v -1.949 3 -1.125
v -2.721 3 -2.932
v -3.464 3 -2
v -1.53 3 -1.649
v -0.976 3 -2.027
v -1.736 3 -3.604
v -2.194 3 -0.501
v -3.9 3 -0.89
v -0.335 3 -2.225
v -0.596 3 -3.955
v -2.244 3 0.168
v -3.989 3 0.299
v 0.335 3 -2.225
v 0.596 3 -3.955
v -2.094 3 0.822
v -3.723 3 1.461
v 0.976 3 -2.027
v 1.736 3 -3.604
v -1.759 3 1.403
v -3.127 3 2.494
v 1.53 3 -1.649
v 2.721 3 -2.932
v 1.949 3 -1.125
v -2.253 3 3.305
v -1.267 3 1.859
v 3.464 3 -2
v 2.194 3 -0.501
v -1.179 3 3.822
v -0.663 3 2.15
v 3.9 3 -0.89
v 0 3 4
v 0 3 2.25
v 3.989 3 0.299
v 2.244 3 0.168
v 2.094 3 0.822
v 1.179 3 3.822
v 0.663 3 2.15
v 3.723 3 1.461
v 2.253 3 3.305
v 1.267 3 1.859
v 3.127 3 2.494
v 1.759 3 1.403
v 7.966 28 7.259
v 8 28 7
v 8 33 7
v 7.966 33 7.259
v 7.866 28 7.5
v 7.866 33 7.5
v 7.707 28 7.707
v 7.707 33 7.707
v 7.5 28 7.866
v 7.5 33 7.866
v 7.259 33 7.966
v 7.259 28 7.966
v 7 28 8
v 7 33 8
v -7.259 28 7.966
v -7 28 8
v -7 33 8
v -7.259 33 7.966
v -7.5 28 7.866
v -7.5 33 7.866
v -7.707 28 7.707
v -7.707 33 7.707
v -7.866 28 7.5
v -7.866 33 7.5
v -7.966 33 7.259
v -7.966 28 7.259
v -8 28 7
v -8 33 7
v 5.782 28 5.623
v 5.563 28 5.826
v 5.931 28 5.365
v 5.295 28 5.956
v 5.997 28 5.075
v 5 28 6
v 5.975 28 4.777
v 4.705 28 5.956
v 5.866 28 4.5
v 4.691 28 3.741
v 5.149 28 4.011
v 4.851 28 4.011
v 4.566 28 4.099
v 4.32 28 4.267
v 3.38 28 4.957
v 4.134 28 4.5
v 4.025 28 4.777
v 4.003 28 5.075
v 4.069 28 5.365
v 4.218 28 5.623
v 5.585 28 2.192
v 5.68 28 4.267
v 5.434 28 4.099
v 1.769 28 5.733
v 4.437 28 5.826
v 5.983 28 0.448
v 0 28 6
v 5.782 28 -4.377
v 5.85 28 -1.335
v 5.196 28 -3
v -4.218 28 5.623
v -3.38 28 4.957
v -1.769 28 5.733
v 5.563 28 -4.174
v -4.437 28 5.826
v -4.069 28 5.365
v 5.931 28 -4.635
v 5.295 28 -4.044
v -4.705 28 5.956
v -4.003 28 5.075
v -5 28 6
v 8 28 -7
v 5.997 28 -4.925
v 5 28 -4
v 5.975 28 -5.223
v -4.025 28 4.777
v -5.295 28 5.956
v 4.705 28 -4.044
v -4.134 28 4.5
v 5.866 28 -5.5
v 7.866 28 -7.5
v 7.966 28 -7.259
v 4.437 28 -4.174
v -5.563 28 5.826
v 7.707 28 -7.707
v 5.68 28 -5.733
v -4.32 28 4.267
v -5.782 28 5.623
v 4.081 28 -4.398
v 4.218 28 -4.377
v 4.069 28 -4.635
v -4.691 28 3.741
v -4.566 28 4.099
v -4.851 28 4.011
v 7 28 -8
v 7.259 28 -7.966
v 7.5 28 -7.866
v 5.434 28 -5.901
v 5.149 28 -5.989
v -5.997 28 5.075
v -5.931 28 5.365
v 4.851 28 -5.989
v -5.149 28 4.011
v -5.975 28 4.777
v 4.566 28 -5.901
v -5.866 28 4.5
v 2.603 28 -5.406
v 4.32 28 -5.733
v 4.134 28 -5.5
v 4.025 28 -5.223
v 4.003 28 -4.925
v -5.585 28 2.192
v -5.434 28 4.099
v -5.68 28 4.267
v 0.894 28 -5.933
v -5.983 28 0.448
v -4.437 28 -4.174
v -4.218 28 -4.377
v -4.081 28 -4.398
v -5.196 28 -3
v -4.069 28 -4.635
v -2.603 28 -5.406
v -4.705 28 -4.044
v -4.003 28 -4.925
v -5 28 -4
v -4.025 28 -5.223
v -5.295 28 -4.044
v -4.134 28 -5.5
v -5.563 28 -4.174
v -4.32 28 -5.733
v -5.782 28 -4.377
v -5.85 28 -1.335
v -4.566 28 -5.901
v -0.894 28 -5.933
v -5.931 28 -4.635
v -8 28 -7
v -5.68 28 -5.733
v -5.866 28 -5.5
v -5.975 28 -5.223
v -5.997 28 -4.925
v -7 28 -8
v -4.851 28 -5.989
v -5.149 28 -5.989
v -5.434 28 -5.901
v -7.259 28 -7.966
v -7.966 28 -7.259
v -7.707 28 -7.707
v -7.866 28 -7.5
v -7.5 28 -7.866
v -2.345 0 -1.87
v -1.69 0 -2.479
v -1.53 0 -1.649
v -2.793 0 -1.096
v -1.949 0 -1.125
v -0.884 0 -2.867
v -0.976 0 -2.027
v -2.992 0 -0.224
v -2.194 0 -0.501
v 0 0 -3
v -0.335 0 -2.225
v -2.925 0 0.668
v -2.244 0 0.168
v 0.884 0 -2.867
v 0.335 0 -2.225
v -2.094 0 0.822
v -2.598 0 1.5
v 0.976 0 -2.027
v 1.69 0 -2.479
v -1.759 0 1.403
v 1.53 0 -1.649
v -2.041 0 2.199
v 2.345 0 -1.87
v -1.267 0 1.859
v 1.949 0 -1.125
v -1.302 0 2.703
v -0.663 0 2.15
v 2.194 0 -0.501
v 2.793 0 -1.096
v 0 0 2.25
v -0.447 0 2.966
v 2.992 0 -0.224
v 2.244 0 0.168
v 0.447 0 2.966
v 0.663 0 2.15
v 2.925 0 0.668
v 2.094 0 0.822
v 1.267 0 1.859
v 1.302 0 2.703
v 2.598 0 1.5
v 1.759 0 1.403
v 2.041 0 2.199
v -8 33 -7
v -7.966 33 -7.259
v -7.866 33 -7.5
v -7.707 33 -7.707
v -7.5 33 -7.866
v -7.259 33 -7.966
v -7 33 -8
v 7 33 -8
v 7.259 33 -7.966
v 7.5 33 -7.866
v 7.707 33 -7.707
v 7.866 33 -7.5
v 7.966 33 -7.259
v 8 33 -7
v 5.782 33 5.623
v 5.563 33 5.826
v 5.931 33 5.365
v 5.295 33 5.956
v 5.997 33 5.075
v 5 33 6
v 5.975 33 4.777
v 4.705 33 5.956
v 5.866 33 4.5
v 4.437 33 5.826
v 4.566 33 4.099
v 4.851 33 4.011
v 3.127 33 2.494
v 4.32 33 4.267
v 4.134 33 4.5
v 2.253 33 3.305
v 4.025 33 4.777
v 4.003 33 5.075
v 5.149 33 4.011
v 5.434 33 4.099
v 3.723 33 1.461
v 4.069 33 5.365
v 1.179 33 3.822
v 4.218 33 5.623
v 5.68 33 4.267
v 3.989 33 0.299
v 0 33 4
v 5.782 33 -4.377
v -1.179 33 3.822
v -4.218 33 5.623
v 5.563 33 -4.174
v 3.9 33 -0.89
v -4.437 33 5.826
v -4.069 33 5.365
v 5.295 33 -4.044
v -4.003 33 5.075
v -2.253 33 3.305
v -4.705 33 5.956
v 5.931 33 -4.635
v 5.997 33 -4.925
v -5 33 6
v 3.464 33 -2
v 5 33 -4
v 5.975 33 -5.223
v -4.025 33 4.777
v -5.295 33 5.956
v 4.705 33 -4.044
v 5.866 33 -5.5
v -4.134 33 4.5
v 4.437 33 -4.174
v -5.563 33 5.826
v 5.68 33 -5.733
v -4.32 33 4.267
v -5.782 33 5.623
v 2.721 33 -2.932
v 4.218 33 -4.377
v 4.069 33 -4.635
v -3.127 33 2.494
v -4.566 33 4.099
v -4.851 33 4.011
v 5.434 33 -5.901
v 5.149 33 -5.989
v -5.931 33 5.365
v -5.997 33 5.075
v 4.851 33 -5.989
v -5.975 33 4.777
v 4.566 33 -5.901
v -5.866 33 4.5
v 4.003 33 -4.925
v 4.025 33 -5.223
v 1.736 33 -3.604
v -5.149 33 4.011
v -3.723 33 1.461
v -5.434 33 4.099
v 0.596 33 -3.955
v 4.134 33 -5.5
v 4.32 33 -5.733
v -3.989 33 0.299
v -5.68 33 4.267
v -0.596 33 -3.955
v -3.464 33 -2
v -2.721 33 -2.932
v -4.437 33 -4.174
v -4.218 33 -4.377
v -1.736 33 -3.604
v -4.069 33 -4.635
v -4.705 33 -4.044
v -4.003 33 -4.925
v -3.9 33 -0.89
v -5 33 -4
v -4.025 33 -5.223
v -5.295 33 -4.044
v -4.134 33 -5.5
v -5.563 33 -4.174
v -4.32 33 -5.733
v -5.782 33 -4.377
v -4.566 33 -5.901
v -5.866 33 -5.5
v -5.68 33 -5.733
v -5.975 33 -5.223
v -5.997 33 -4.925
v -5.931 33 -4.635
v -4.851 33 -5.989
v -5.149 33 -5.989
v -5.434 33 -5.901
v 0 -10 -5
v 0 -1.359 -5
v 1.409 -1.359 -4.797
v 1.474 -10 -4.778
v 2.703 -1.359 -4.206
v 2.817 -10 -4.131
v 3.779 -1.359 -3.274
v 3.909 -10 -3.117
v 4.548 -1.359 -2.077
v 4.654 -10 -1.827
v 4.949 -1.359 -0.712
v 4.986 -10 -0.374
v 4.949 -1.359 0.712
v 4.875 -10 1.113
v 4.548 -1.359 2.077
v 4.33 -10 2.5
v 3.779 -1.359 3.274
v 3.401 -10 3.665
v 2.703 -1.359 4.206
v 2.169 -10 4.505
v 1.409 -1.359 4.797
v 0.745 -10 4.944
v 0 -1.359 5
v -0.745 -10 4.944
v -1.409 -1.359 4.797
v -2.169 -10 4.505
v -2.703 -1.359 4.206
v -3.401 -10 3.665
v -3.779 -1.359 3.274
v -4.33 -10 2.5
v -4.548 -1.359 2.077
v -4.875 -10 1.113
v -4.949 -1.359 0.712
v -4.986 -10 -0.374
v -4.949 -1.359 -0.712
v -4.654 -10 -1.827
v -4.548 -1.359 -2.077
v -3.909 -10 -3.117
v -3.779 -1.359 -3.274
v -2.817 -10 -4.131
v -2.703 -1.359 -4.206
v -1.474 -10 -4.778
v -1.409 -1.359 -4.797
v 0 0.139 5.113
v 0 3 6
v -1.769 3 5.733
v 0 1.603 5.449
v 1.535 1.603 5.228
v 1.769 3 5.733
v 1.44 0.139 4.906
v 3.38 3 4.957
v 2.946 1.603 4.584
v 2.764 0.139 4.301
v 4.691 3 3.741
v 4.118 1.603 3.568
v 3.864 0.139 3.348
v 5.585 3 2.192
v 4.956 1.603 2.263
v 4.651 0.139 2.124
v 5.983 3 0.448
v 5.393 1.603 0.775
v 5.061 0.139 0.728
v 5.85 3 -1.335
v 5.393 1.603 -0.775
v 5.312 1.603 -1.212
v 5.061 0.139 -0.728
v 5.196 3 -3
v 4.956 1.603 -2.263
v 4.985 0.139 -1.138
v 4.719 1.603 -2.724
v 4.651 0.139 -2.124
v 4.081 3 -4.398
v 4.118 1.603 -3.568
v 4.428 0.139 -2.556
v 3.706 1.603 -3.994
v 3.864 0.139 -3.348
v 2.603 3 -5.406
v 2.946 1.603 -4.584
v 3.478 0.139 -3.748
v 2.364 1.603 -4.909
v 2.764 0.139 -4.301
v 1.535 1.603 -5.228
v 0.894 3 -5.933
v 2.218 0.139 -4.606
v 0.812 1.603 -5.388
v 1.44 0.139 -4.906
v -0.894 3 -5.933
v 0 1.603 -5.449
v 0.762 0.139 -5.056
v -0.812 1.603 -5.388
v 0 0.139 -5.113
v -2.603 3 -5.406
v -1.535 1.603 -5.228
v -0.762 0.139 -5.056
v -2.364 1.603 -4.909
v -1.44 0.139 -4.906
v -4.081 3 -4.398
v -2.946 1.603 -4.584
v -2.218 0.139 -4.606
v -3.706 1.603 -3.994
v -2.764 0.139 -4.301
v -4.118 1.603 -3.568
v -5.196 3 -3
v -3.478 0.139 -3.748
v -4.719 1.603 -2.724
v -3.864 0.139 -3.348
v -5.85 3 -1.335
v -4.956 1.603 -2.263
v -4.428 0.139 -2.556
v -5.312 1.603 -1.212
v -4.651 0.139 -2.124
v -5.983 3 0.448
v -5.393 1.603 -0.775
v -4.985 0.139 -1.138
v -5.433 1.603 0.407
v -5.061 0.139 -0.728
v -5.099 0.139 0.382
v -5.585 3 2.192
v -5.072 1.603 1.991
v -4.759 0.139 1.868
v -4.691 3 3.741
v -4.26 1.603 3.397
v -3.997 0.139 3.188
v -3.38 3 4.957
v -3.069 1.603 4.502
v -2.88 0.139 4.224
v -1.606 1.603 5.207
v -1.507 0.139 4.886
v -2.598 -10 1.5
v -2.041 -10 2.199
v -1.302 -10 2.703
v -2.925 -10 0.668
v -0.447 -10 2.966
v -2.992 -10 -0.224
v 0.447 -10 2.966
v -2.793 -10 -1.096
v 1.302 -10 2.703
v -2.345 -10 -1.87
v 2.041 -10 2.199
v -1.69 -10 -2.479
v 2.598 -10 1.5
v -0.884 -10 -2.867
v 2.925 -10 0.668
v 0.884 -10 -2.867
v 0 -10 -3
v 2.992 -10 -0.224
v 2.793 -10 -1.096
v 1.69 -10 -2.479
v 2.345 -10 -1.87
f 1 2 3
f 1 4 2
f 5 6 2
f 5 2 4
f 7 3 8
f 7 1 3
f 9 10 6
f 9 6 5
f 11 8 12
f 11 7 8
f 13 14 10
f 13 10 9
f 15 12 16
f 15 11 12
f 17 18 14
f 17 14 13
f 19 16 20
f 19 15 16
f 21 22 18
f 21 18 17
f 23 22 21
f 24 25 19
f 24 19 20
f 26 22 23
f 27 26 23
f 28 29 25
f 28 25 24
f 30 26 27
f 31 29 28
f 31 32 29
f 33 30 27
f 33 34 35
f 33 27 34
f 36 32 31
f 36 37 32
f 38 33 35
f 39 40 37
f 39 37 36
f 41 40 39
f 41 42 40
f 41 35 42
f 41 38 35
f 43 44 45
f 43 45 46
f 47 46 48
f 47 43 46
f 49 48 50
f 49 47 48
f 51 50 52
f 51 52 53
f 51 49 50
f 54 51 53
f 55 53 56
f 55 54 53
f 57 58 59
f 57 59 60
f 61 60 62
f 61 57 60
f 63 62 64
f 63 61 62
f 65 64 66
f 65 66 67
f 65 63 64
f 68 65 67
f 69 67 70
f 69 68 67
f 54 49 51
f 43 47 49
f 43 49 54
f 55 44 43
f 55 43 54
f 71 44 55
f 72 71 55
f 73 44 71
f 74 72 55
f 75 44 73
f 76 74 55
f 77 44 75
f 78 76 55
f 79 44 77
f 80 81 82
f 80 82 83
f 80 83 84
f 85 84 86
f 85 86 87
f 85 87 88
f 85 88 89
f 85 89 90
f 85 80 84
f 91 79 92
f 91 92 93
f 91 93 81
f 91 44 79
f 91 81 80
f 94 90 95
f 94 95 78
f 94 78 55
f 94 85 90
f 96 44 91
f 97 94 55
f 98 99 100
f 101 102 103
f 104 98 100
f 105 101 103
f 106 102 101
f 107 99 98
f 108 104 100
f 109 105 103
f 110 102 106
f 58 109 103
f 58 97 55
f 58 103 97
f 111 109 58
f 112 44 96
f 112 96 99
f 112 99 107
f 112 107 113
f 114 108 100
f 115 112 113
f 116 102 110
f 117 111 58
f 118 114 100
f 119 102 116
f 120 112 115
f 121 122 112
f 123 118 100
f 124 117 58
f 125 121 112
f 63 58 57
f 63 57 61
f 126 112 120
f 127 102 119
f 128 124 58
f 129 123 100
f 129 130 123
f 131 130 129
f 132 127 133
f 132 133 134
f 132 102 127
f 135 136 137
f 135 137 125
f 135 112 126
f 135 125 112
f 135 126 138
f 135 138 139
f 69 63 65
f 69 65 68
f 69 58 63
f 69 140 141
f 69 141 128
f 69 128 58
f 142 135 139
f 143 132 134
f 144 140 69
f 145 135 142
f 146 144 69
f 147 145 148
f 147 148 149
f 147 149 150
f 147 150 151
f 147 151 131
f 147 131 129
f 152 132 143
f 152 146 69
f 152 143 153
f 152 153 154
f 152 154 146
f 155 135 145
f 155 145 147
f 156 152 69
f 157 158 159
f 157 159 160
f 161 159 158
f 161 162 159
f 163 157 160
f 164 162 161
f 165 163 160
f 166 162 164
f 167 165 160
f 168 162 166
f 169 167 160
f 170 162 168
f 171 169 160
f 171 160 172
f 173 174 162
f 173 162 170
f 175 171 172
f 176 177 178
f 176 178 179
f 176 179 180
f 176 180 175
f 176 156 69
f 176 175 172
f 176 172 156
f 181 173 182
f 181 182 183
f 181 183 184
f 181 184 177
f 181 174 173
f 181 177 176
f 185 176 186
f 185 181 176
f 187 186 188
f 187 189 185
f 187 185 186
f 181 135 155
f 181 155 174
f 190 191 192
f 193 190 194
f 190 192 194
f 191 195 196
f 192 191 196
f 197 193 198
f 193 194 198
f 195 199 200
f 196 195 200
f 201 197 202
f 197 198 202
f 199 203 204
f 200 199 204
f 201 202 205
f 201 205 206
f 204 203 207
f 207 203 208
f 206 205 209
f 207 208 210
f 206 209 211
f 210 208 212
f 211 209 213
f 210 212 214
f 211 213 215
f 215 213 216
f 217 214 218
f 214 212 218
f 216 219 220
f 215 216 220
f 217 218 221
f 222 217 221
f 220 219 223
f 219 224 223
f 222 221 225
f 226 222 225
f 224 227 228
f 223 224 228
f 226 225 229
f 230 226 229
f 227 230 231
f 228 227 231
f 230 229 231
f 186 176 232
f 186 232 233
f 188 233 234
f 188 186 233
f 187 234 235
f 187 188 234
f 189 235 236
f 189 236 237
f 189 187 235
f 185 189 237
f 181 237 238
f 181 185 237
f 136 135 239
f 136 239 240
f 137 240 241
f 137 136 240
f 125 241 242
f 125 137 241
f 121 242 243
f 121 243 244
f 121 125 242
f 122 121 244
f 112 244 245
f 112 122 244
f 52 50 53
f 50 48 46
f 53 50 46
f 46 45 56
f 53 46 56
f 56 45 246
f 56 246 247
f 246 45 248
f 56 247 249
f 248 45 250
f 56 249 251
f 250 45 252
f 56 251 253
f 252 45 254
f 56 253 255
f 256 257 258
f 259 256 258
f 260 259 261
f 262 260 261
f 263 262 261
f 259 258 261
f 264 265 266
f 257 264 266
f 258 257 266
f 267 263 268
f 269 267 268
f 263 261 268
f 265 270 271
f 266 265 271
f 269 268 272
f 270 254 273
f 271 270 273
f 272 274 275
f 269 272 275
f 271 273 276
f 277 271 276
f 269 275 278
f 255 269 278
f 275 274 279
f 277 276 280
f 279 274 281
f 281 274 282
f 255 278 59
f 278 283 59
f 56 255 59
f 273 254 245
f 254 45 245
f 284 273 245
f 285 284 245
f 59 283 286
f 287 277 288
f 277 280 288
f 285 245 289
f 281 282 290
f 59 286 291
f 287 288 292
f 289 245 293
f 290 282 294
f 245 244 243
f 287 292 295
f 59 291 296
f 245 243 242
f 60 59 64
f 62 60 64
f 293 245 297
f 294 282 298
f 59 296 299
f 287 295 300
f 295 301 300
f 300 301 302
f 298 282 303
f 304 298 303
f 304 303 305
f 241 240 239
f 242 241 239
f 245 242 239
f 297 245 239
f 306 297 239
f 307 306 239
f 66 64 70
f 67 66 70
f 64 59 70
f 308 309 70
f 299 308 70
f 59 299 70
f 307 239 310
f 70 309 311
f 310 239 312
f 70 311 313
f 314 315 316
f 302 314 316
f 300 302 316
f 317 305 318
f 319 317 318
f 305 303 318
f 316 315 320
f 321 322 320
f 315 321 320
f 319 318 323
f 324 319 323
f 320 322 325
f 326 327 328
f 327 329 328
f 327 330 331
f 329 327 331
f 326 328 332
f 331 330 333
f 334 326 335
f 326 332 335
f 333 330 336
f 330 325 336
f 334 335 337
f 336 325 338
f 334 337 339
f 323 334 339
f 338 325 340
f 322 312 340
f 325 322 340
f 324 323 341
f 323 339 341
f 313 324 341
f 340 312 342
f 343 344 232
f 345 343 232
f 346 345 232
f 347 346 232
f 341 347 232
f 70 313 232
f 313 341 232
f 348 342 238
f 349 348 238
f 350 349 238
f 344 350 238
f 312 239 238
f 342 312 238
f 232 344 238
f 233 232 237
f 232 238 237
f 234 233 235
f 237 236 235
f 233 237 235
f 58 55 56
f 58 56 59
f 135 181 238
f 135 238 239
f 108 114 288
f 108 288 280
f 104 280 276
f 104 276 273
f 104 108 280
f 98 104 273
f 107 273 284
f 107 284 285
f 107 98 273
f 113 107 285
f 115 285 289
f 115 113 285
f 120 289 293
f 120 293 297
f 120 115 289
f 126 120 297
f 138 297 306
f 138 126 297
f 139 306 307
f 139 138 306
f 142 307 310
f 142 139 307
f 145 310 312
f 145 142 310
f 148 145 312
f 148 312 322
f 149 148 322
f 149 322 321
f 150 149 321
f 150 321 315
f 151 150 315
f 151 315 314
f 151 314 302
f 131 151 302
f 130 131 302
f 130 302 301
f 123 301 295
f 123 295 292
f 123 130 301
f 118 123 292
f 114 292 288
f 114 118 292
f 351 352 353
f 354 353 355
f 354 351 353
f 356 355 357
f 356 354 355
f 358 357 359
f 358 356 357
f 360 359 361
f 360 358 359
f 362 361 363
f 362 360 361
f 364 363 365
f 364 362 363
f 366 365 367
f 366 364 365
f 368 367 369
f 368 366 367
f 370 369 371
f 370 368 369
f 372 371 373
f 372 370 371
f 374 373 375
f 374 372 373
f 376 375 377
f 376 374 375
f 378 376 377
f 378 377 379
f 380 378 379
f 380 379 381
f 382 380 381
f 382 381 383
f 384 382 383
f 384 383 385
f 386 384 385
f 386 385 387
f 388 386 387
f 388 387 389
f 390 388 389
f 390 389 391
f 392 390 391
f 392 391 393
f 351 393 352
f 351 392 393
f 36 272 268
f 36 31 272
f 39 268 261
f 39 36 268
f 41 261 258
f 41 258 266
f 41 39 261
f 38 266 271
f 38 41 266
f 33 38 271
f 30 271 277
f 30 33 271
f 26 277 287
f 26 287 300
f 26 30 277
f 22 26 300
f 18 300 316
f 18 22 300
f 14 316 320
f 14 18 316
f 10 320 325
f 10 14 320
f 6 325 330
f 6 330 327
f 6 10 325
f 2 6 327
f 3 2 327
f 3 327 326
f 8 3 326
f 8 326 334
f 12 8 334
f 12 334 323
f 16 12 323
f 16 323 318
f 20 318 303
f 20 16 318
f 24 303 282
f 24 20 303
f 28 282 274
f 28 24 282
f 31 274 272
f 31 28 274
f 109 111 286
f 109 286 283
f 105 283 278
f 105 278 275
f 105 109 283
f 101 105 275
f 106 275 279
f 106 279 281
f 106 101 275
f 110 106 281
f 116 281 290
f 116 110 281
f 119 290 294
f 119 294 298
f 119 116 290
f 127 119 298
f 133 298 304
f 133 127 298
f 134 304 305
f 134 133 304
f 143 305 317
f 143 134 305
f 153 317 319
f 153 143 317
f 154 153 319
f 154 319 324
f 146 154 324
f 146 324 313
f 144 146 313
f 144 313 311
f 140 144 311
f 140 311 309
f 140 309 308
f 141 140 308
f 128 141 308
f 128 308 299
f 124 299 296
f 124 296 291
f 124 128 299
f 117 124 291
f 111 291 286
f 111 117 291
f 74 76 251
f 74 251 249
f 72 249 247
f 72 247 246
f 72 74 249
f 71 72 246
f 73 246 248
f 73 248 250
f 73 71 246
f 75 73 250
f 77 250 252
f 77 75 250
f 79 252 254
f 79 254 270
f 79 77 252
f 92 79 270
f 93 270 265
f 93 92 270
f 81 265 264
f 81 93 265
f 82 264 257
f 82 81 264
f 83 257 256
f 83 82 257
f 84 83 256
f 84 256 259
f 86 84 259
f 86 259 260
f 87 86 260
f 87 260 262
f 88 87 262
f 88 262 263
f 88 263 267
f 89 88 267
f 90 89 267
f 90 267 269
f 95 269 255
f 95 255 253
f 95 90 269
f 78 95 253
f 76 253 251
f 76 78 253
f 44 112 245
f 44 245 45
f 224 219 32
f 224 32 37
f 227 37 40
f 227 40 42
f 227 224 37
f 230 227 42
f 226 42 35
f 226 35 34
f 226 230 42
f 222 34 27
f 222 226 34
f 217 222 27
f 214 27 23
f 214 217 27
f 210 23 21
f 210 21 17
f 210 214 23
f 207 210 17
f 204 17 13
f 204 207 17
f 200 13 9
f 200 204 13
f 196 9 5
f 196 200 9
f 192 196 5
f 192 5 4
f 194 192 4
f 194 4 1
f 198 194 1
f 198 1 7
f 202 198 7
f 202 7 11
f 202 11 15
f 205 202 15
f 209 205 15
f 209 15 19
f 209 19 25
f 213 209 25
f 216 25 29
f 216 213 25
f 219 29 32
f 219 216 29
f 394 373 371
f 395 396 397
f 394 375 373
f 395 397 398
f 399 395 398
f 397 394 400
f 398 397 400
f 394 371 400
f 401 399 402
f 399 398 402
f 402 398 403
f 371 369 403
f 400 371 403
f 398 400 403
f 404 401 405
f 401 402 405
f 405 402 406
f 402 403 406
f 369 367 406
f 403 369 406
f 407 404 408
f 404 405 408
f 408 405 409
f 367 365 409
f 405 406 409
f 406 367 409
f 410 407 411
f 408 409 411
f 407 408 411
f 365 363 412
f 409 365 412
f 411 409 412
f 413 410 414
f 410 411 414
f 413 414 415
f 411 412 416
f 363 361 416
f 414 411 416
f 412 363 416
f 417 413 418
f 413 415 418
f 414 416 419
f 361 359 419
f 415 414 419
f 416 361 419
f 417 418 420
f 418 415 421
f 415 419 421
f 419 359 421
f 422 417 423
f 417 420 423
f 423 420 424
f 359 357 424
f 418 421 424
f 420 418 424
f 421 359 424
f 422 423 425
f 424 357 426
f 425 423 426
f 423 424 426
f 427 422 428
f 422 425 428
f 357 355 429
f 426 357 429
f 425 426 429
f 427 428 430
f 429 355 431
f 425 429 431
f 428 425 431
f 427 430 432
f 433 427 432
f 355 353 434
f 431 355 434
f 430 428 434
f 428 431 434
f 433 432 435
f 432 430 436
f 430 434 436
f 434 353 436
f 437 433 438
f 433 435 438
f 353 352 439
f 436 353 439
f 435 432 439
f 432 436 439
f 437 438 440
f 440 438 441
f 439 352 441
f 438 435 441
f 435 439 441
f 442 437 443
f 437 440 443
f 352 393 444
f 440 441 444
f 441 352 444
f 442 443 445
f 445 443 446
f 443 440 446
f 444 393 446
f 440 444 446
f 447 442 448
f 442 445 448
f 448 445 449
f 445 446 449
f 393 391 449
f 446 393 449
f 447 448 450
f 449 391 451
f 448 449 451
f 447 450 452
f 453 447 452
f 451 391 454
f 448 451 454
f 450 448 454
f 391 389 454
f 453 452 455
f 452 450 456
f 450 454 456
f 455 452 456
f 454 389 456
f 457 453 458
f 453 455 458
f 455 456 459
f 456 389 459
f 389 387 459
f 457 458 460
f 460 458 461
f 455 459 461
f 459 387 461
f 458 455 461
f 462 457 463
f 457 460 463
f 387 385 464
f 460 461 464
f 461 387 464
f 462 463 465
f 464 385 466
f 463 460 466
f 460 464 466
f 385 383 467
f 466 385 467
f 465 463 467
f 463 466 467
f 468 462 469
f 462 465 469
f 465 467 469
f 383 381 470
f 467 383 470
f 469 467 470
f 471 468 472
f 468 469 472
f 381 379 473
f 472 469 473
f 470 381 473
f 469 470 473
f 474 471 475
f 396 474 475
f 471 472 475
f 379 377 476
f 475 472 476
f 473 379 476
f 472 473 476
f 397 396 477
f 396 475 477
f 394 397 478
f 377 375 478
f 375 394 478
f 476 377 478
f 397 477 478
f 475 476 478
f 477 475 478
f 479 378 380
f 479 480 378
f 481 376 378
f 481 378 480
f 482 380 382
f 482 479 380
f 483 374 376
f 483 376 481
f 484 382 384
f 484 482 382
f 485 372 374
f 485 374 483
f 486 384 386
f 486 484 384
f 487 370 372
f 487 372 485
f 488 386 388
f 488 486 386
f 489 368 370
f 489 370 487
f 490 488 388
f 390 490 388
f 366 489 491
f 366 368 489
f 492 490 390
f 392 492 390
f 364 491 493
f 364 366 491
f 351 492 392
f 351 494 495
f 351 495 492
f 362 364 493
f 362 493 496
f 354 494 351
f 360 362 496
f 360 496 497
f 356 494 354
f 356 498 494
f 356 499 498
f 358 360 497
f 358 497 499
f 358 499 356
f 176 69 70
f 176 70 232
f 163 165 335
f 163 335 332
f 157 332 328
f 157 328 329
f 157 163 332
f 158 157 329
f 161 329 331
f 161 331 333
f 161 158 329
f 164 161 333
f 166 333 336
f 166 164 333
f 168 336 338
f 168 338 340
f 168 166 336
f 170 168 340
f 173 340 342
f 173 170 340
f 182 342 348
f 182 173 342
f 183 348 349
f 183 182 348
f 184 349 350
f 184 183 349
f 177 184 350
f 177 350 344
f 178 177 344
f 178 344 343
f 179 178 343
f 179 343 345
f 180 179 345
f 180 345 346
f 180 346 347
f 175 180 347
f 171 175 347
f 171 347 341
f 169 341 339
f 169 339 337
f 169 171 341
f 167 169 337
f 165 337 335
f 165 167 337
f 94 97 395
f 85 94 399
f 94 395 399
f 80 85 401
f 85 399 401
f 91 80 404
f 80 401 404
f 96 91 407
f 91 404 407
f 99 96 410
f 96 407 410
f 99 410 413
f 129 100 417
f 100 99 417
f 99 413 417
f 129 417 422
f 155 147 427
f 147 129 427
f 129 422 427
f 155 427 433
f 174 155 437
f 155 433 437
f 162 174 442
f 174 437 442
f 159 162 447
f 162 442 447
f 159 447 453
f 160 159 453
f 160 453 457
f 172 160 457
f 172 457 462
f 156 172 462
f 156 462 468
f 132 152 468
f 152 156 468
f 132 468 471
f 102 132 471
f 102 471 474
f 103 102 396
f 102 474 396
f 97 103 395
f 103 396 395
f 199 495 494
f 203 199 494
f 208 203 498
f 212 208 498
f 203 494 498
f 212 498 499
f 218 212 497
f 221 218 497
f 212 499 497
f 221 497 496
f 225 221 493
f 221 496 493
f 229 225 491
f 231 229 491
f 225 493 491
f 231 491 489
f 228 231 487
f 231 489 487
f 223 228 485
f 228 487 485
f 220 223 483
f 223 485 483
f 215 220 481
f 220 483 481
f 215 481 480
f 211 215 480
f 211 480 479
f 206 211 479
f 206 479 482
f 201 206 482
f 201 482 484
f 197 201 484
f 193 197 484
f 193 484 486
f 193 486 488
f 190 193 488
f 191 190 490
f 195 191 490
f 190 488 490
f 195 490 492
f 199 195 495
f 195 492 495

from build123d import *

# Parameters (mm, degrees)
SKETCH1_R           = 5
SKETCH1_R_2         = 2.25
BOSS_EXTRUDE1_DEPTH = 3
BOSS_EXTRUDE2_START = 10
SKETCH2_R           = 5
SKETCH2_R_2         = 3
BOSS_EXTRUDE2_DEPTH = 10
SKETCH3_R           = 6
SKETCH3_R_2         = 4
BOSS_EXTRUDE3_DEPTH = 30
FILLET1_R           = 10
BOSS_EXTRUDE4_START = -5
SKETCH4_R           = 4
SKETCH4_R_2         = 1
BOSS_EXTRUDE4_DEPTH = 5


with BuildPart() as part:
    # Sketch1 → Boss-Extrude1 (new body)
    with BuildSketch(Plane(origin=(0, 0, 0), x_dir=(1, 0, 0), z_dir=(0, 1, 0))):
        with Locations(Location((0, 0, 0), (0, 0, 270))):
            Circle(SKETCH1_R)
        with Locations(Location((0, 0, 0), (0, 0, 270))):
            Circle(SKETCH1_R_2, mode=Mode.SUBTRACT)
    extrude(amount=BOSS_EXTRUDE1_DEPTH)

    # Sketch2 → Boss-Extrude2 (add)
    with BuildSketch(Plane.XZ.offset(BOSS_EXTRUDE2_START)):
        with Locations(Location((0, 0, 0), (0, 0, 270))):
            Circle(SKETCH2_R)
        with Locations(Location((0, 0, 0), (0, 0, 270))):
            Circle(SKETCH2_R_2, mode=Mode.SUBTRACT)
    extrude(amount=-BOSS_EXTRUDE2_DEPTH)

    # Sketch3 → Boss-Extrude3 (add)
    with BuildSketch(Plane(origin=(0, 3, 0), x_dir=(1, 0, 0), z_dir=(0, 1, 0))):
        with Locations(Location((0, 0, 0), (0, 0, 270))):
            Circle(SKETCH3_R)
        with Locations(Location((0, 0, 0), (0, 0, 270))):
            Circle(SKETCH3_R_2, mode=Mode.SUBTRACT)
    extrude(amount=BOSS_EXTRUDE3_DEPTH)

    # Fillet1
    # the kernel refuses this fillet: 10 mm, written as the material it adds along each edge
    with BuildSketch(Plane(origin=(0, 3, 0), x_dir=(0, 0, 1), z_dir=(-1, 0, 0))) as fillet1_piece_1:
        with BuildLine():
            CenterArc((15, -4.358898944), FILLET1_R, 154.158067237, 25.841932763)
            Line((6, 0), (5.82, 0.087177979))
            ThreePointArc((5.82, 0.087177979), (5.5, 0.2), (5, 0.2))
            Line((5, 0.2), (4.8, 0))
            Line((4.8, 0), (4.8, -4.358898944))
            Line((4.8, -4.358898944), (5, -4.358898944))
        make_face()
    revolve(axis=Axis((0, 3, 0), (0, 1, 0)))

    # Sketch4 → Boss-Extrude4 (add)
    with BuildSketch(Plane(origin=(0, 33, 0), x_dir=(1, 0, 0), z_dir=(0, 1, 0)).offset(BOSS_EXTRUDE4_START)):
        with BuildLine():
            Line((-8, 0), (-8, 7))
            ThreePointArc((-8, 7), (-7.707106781, 7.707106781), (-7, 8))
            Line((-7, 8), (7, 8))
            ThreePointArc((7, 8), (7.707106781, 7.707106781), (8, 7))
            Line((8, 7), (8, -7))
            ThreePointArc((8, -7), (7.707106781, -7.707106781), (7, -8))
            Line((7, -8), (-7, -8))
            ThreePointArc((-7, -8), (-7.707106781, -7.707106781), (-8, -7))
            Line((-8, -7), (-8, 0))
        make_face()
        with Locations(Location((0, 0, 0), (0, 0, 270))):
            Circle(SKETCH4_R, mode=Mode.SUBTRACT)
        with Locations(Location((-5, 5, 0), (0, 0, 270))):
            Circle(SKETCH4_R_2, mode=Mode.SUBTRACT)
        with Locations(Location((5, 5, 0), (0, 0, 270))):
            Circle(SKETCH4_R_2, mode=Mode.SUBTRACT)
        with Locations(Location((-5, -5, 0), (0, 0, 270))):
            Circle(SKETCH4_R_2, mode=Mode.SUBTRACT)
        with Locations(Location((5, -5, 0), (0, 0, 270))):
            Circle(SKETCH4_R_2, mode=Mode.SUBTRACT)
    extrude(amount=BOSS_EXTRUDE4_DEPTH)


solid = part.part
